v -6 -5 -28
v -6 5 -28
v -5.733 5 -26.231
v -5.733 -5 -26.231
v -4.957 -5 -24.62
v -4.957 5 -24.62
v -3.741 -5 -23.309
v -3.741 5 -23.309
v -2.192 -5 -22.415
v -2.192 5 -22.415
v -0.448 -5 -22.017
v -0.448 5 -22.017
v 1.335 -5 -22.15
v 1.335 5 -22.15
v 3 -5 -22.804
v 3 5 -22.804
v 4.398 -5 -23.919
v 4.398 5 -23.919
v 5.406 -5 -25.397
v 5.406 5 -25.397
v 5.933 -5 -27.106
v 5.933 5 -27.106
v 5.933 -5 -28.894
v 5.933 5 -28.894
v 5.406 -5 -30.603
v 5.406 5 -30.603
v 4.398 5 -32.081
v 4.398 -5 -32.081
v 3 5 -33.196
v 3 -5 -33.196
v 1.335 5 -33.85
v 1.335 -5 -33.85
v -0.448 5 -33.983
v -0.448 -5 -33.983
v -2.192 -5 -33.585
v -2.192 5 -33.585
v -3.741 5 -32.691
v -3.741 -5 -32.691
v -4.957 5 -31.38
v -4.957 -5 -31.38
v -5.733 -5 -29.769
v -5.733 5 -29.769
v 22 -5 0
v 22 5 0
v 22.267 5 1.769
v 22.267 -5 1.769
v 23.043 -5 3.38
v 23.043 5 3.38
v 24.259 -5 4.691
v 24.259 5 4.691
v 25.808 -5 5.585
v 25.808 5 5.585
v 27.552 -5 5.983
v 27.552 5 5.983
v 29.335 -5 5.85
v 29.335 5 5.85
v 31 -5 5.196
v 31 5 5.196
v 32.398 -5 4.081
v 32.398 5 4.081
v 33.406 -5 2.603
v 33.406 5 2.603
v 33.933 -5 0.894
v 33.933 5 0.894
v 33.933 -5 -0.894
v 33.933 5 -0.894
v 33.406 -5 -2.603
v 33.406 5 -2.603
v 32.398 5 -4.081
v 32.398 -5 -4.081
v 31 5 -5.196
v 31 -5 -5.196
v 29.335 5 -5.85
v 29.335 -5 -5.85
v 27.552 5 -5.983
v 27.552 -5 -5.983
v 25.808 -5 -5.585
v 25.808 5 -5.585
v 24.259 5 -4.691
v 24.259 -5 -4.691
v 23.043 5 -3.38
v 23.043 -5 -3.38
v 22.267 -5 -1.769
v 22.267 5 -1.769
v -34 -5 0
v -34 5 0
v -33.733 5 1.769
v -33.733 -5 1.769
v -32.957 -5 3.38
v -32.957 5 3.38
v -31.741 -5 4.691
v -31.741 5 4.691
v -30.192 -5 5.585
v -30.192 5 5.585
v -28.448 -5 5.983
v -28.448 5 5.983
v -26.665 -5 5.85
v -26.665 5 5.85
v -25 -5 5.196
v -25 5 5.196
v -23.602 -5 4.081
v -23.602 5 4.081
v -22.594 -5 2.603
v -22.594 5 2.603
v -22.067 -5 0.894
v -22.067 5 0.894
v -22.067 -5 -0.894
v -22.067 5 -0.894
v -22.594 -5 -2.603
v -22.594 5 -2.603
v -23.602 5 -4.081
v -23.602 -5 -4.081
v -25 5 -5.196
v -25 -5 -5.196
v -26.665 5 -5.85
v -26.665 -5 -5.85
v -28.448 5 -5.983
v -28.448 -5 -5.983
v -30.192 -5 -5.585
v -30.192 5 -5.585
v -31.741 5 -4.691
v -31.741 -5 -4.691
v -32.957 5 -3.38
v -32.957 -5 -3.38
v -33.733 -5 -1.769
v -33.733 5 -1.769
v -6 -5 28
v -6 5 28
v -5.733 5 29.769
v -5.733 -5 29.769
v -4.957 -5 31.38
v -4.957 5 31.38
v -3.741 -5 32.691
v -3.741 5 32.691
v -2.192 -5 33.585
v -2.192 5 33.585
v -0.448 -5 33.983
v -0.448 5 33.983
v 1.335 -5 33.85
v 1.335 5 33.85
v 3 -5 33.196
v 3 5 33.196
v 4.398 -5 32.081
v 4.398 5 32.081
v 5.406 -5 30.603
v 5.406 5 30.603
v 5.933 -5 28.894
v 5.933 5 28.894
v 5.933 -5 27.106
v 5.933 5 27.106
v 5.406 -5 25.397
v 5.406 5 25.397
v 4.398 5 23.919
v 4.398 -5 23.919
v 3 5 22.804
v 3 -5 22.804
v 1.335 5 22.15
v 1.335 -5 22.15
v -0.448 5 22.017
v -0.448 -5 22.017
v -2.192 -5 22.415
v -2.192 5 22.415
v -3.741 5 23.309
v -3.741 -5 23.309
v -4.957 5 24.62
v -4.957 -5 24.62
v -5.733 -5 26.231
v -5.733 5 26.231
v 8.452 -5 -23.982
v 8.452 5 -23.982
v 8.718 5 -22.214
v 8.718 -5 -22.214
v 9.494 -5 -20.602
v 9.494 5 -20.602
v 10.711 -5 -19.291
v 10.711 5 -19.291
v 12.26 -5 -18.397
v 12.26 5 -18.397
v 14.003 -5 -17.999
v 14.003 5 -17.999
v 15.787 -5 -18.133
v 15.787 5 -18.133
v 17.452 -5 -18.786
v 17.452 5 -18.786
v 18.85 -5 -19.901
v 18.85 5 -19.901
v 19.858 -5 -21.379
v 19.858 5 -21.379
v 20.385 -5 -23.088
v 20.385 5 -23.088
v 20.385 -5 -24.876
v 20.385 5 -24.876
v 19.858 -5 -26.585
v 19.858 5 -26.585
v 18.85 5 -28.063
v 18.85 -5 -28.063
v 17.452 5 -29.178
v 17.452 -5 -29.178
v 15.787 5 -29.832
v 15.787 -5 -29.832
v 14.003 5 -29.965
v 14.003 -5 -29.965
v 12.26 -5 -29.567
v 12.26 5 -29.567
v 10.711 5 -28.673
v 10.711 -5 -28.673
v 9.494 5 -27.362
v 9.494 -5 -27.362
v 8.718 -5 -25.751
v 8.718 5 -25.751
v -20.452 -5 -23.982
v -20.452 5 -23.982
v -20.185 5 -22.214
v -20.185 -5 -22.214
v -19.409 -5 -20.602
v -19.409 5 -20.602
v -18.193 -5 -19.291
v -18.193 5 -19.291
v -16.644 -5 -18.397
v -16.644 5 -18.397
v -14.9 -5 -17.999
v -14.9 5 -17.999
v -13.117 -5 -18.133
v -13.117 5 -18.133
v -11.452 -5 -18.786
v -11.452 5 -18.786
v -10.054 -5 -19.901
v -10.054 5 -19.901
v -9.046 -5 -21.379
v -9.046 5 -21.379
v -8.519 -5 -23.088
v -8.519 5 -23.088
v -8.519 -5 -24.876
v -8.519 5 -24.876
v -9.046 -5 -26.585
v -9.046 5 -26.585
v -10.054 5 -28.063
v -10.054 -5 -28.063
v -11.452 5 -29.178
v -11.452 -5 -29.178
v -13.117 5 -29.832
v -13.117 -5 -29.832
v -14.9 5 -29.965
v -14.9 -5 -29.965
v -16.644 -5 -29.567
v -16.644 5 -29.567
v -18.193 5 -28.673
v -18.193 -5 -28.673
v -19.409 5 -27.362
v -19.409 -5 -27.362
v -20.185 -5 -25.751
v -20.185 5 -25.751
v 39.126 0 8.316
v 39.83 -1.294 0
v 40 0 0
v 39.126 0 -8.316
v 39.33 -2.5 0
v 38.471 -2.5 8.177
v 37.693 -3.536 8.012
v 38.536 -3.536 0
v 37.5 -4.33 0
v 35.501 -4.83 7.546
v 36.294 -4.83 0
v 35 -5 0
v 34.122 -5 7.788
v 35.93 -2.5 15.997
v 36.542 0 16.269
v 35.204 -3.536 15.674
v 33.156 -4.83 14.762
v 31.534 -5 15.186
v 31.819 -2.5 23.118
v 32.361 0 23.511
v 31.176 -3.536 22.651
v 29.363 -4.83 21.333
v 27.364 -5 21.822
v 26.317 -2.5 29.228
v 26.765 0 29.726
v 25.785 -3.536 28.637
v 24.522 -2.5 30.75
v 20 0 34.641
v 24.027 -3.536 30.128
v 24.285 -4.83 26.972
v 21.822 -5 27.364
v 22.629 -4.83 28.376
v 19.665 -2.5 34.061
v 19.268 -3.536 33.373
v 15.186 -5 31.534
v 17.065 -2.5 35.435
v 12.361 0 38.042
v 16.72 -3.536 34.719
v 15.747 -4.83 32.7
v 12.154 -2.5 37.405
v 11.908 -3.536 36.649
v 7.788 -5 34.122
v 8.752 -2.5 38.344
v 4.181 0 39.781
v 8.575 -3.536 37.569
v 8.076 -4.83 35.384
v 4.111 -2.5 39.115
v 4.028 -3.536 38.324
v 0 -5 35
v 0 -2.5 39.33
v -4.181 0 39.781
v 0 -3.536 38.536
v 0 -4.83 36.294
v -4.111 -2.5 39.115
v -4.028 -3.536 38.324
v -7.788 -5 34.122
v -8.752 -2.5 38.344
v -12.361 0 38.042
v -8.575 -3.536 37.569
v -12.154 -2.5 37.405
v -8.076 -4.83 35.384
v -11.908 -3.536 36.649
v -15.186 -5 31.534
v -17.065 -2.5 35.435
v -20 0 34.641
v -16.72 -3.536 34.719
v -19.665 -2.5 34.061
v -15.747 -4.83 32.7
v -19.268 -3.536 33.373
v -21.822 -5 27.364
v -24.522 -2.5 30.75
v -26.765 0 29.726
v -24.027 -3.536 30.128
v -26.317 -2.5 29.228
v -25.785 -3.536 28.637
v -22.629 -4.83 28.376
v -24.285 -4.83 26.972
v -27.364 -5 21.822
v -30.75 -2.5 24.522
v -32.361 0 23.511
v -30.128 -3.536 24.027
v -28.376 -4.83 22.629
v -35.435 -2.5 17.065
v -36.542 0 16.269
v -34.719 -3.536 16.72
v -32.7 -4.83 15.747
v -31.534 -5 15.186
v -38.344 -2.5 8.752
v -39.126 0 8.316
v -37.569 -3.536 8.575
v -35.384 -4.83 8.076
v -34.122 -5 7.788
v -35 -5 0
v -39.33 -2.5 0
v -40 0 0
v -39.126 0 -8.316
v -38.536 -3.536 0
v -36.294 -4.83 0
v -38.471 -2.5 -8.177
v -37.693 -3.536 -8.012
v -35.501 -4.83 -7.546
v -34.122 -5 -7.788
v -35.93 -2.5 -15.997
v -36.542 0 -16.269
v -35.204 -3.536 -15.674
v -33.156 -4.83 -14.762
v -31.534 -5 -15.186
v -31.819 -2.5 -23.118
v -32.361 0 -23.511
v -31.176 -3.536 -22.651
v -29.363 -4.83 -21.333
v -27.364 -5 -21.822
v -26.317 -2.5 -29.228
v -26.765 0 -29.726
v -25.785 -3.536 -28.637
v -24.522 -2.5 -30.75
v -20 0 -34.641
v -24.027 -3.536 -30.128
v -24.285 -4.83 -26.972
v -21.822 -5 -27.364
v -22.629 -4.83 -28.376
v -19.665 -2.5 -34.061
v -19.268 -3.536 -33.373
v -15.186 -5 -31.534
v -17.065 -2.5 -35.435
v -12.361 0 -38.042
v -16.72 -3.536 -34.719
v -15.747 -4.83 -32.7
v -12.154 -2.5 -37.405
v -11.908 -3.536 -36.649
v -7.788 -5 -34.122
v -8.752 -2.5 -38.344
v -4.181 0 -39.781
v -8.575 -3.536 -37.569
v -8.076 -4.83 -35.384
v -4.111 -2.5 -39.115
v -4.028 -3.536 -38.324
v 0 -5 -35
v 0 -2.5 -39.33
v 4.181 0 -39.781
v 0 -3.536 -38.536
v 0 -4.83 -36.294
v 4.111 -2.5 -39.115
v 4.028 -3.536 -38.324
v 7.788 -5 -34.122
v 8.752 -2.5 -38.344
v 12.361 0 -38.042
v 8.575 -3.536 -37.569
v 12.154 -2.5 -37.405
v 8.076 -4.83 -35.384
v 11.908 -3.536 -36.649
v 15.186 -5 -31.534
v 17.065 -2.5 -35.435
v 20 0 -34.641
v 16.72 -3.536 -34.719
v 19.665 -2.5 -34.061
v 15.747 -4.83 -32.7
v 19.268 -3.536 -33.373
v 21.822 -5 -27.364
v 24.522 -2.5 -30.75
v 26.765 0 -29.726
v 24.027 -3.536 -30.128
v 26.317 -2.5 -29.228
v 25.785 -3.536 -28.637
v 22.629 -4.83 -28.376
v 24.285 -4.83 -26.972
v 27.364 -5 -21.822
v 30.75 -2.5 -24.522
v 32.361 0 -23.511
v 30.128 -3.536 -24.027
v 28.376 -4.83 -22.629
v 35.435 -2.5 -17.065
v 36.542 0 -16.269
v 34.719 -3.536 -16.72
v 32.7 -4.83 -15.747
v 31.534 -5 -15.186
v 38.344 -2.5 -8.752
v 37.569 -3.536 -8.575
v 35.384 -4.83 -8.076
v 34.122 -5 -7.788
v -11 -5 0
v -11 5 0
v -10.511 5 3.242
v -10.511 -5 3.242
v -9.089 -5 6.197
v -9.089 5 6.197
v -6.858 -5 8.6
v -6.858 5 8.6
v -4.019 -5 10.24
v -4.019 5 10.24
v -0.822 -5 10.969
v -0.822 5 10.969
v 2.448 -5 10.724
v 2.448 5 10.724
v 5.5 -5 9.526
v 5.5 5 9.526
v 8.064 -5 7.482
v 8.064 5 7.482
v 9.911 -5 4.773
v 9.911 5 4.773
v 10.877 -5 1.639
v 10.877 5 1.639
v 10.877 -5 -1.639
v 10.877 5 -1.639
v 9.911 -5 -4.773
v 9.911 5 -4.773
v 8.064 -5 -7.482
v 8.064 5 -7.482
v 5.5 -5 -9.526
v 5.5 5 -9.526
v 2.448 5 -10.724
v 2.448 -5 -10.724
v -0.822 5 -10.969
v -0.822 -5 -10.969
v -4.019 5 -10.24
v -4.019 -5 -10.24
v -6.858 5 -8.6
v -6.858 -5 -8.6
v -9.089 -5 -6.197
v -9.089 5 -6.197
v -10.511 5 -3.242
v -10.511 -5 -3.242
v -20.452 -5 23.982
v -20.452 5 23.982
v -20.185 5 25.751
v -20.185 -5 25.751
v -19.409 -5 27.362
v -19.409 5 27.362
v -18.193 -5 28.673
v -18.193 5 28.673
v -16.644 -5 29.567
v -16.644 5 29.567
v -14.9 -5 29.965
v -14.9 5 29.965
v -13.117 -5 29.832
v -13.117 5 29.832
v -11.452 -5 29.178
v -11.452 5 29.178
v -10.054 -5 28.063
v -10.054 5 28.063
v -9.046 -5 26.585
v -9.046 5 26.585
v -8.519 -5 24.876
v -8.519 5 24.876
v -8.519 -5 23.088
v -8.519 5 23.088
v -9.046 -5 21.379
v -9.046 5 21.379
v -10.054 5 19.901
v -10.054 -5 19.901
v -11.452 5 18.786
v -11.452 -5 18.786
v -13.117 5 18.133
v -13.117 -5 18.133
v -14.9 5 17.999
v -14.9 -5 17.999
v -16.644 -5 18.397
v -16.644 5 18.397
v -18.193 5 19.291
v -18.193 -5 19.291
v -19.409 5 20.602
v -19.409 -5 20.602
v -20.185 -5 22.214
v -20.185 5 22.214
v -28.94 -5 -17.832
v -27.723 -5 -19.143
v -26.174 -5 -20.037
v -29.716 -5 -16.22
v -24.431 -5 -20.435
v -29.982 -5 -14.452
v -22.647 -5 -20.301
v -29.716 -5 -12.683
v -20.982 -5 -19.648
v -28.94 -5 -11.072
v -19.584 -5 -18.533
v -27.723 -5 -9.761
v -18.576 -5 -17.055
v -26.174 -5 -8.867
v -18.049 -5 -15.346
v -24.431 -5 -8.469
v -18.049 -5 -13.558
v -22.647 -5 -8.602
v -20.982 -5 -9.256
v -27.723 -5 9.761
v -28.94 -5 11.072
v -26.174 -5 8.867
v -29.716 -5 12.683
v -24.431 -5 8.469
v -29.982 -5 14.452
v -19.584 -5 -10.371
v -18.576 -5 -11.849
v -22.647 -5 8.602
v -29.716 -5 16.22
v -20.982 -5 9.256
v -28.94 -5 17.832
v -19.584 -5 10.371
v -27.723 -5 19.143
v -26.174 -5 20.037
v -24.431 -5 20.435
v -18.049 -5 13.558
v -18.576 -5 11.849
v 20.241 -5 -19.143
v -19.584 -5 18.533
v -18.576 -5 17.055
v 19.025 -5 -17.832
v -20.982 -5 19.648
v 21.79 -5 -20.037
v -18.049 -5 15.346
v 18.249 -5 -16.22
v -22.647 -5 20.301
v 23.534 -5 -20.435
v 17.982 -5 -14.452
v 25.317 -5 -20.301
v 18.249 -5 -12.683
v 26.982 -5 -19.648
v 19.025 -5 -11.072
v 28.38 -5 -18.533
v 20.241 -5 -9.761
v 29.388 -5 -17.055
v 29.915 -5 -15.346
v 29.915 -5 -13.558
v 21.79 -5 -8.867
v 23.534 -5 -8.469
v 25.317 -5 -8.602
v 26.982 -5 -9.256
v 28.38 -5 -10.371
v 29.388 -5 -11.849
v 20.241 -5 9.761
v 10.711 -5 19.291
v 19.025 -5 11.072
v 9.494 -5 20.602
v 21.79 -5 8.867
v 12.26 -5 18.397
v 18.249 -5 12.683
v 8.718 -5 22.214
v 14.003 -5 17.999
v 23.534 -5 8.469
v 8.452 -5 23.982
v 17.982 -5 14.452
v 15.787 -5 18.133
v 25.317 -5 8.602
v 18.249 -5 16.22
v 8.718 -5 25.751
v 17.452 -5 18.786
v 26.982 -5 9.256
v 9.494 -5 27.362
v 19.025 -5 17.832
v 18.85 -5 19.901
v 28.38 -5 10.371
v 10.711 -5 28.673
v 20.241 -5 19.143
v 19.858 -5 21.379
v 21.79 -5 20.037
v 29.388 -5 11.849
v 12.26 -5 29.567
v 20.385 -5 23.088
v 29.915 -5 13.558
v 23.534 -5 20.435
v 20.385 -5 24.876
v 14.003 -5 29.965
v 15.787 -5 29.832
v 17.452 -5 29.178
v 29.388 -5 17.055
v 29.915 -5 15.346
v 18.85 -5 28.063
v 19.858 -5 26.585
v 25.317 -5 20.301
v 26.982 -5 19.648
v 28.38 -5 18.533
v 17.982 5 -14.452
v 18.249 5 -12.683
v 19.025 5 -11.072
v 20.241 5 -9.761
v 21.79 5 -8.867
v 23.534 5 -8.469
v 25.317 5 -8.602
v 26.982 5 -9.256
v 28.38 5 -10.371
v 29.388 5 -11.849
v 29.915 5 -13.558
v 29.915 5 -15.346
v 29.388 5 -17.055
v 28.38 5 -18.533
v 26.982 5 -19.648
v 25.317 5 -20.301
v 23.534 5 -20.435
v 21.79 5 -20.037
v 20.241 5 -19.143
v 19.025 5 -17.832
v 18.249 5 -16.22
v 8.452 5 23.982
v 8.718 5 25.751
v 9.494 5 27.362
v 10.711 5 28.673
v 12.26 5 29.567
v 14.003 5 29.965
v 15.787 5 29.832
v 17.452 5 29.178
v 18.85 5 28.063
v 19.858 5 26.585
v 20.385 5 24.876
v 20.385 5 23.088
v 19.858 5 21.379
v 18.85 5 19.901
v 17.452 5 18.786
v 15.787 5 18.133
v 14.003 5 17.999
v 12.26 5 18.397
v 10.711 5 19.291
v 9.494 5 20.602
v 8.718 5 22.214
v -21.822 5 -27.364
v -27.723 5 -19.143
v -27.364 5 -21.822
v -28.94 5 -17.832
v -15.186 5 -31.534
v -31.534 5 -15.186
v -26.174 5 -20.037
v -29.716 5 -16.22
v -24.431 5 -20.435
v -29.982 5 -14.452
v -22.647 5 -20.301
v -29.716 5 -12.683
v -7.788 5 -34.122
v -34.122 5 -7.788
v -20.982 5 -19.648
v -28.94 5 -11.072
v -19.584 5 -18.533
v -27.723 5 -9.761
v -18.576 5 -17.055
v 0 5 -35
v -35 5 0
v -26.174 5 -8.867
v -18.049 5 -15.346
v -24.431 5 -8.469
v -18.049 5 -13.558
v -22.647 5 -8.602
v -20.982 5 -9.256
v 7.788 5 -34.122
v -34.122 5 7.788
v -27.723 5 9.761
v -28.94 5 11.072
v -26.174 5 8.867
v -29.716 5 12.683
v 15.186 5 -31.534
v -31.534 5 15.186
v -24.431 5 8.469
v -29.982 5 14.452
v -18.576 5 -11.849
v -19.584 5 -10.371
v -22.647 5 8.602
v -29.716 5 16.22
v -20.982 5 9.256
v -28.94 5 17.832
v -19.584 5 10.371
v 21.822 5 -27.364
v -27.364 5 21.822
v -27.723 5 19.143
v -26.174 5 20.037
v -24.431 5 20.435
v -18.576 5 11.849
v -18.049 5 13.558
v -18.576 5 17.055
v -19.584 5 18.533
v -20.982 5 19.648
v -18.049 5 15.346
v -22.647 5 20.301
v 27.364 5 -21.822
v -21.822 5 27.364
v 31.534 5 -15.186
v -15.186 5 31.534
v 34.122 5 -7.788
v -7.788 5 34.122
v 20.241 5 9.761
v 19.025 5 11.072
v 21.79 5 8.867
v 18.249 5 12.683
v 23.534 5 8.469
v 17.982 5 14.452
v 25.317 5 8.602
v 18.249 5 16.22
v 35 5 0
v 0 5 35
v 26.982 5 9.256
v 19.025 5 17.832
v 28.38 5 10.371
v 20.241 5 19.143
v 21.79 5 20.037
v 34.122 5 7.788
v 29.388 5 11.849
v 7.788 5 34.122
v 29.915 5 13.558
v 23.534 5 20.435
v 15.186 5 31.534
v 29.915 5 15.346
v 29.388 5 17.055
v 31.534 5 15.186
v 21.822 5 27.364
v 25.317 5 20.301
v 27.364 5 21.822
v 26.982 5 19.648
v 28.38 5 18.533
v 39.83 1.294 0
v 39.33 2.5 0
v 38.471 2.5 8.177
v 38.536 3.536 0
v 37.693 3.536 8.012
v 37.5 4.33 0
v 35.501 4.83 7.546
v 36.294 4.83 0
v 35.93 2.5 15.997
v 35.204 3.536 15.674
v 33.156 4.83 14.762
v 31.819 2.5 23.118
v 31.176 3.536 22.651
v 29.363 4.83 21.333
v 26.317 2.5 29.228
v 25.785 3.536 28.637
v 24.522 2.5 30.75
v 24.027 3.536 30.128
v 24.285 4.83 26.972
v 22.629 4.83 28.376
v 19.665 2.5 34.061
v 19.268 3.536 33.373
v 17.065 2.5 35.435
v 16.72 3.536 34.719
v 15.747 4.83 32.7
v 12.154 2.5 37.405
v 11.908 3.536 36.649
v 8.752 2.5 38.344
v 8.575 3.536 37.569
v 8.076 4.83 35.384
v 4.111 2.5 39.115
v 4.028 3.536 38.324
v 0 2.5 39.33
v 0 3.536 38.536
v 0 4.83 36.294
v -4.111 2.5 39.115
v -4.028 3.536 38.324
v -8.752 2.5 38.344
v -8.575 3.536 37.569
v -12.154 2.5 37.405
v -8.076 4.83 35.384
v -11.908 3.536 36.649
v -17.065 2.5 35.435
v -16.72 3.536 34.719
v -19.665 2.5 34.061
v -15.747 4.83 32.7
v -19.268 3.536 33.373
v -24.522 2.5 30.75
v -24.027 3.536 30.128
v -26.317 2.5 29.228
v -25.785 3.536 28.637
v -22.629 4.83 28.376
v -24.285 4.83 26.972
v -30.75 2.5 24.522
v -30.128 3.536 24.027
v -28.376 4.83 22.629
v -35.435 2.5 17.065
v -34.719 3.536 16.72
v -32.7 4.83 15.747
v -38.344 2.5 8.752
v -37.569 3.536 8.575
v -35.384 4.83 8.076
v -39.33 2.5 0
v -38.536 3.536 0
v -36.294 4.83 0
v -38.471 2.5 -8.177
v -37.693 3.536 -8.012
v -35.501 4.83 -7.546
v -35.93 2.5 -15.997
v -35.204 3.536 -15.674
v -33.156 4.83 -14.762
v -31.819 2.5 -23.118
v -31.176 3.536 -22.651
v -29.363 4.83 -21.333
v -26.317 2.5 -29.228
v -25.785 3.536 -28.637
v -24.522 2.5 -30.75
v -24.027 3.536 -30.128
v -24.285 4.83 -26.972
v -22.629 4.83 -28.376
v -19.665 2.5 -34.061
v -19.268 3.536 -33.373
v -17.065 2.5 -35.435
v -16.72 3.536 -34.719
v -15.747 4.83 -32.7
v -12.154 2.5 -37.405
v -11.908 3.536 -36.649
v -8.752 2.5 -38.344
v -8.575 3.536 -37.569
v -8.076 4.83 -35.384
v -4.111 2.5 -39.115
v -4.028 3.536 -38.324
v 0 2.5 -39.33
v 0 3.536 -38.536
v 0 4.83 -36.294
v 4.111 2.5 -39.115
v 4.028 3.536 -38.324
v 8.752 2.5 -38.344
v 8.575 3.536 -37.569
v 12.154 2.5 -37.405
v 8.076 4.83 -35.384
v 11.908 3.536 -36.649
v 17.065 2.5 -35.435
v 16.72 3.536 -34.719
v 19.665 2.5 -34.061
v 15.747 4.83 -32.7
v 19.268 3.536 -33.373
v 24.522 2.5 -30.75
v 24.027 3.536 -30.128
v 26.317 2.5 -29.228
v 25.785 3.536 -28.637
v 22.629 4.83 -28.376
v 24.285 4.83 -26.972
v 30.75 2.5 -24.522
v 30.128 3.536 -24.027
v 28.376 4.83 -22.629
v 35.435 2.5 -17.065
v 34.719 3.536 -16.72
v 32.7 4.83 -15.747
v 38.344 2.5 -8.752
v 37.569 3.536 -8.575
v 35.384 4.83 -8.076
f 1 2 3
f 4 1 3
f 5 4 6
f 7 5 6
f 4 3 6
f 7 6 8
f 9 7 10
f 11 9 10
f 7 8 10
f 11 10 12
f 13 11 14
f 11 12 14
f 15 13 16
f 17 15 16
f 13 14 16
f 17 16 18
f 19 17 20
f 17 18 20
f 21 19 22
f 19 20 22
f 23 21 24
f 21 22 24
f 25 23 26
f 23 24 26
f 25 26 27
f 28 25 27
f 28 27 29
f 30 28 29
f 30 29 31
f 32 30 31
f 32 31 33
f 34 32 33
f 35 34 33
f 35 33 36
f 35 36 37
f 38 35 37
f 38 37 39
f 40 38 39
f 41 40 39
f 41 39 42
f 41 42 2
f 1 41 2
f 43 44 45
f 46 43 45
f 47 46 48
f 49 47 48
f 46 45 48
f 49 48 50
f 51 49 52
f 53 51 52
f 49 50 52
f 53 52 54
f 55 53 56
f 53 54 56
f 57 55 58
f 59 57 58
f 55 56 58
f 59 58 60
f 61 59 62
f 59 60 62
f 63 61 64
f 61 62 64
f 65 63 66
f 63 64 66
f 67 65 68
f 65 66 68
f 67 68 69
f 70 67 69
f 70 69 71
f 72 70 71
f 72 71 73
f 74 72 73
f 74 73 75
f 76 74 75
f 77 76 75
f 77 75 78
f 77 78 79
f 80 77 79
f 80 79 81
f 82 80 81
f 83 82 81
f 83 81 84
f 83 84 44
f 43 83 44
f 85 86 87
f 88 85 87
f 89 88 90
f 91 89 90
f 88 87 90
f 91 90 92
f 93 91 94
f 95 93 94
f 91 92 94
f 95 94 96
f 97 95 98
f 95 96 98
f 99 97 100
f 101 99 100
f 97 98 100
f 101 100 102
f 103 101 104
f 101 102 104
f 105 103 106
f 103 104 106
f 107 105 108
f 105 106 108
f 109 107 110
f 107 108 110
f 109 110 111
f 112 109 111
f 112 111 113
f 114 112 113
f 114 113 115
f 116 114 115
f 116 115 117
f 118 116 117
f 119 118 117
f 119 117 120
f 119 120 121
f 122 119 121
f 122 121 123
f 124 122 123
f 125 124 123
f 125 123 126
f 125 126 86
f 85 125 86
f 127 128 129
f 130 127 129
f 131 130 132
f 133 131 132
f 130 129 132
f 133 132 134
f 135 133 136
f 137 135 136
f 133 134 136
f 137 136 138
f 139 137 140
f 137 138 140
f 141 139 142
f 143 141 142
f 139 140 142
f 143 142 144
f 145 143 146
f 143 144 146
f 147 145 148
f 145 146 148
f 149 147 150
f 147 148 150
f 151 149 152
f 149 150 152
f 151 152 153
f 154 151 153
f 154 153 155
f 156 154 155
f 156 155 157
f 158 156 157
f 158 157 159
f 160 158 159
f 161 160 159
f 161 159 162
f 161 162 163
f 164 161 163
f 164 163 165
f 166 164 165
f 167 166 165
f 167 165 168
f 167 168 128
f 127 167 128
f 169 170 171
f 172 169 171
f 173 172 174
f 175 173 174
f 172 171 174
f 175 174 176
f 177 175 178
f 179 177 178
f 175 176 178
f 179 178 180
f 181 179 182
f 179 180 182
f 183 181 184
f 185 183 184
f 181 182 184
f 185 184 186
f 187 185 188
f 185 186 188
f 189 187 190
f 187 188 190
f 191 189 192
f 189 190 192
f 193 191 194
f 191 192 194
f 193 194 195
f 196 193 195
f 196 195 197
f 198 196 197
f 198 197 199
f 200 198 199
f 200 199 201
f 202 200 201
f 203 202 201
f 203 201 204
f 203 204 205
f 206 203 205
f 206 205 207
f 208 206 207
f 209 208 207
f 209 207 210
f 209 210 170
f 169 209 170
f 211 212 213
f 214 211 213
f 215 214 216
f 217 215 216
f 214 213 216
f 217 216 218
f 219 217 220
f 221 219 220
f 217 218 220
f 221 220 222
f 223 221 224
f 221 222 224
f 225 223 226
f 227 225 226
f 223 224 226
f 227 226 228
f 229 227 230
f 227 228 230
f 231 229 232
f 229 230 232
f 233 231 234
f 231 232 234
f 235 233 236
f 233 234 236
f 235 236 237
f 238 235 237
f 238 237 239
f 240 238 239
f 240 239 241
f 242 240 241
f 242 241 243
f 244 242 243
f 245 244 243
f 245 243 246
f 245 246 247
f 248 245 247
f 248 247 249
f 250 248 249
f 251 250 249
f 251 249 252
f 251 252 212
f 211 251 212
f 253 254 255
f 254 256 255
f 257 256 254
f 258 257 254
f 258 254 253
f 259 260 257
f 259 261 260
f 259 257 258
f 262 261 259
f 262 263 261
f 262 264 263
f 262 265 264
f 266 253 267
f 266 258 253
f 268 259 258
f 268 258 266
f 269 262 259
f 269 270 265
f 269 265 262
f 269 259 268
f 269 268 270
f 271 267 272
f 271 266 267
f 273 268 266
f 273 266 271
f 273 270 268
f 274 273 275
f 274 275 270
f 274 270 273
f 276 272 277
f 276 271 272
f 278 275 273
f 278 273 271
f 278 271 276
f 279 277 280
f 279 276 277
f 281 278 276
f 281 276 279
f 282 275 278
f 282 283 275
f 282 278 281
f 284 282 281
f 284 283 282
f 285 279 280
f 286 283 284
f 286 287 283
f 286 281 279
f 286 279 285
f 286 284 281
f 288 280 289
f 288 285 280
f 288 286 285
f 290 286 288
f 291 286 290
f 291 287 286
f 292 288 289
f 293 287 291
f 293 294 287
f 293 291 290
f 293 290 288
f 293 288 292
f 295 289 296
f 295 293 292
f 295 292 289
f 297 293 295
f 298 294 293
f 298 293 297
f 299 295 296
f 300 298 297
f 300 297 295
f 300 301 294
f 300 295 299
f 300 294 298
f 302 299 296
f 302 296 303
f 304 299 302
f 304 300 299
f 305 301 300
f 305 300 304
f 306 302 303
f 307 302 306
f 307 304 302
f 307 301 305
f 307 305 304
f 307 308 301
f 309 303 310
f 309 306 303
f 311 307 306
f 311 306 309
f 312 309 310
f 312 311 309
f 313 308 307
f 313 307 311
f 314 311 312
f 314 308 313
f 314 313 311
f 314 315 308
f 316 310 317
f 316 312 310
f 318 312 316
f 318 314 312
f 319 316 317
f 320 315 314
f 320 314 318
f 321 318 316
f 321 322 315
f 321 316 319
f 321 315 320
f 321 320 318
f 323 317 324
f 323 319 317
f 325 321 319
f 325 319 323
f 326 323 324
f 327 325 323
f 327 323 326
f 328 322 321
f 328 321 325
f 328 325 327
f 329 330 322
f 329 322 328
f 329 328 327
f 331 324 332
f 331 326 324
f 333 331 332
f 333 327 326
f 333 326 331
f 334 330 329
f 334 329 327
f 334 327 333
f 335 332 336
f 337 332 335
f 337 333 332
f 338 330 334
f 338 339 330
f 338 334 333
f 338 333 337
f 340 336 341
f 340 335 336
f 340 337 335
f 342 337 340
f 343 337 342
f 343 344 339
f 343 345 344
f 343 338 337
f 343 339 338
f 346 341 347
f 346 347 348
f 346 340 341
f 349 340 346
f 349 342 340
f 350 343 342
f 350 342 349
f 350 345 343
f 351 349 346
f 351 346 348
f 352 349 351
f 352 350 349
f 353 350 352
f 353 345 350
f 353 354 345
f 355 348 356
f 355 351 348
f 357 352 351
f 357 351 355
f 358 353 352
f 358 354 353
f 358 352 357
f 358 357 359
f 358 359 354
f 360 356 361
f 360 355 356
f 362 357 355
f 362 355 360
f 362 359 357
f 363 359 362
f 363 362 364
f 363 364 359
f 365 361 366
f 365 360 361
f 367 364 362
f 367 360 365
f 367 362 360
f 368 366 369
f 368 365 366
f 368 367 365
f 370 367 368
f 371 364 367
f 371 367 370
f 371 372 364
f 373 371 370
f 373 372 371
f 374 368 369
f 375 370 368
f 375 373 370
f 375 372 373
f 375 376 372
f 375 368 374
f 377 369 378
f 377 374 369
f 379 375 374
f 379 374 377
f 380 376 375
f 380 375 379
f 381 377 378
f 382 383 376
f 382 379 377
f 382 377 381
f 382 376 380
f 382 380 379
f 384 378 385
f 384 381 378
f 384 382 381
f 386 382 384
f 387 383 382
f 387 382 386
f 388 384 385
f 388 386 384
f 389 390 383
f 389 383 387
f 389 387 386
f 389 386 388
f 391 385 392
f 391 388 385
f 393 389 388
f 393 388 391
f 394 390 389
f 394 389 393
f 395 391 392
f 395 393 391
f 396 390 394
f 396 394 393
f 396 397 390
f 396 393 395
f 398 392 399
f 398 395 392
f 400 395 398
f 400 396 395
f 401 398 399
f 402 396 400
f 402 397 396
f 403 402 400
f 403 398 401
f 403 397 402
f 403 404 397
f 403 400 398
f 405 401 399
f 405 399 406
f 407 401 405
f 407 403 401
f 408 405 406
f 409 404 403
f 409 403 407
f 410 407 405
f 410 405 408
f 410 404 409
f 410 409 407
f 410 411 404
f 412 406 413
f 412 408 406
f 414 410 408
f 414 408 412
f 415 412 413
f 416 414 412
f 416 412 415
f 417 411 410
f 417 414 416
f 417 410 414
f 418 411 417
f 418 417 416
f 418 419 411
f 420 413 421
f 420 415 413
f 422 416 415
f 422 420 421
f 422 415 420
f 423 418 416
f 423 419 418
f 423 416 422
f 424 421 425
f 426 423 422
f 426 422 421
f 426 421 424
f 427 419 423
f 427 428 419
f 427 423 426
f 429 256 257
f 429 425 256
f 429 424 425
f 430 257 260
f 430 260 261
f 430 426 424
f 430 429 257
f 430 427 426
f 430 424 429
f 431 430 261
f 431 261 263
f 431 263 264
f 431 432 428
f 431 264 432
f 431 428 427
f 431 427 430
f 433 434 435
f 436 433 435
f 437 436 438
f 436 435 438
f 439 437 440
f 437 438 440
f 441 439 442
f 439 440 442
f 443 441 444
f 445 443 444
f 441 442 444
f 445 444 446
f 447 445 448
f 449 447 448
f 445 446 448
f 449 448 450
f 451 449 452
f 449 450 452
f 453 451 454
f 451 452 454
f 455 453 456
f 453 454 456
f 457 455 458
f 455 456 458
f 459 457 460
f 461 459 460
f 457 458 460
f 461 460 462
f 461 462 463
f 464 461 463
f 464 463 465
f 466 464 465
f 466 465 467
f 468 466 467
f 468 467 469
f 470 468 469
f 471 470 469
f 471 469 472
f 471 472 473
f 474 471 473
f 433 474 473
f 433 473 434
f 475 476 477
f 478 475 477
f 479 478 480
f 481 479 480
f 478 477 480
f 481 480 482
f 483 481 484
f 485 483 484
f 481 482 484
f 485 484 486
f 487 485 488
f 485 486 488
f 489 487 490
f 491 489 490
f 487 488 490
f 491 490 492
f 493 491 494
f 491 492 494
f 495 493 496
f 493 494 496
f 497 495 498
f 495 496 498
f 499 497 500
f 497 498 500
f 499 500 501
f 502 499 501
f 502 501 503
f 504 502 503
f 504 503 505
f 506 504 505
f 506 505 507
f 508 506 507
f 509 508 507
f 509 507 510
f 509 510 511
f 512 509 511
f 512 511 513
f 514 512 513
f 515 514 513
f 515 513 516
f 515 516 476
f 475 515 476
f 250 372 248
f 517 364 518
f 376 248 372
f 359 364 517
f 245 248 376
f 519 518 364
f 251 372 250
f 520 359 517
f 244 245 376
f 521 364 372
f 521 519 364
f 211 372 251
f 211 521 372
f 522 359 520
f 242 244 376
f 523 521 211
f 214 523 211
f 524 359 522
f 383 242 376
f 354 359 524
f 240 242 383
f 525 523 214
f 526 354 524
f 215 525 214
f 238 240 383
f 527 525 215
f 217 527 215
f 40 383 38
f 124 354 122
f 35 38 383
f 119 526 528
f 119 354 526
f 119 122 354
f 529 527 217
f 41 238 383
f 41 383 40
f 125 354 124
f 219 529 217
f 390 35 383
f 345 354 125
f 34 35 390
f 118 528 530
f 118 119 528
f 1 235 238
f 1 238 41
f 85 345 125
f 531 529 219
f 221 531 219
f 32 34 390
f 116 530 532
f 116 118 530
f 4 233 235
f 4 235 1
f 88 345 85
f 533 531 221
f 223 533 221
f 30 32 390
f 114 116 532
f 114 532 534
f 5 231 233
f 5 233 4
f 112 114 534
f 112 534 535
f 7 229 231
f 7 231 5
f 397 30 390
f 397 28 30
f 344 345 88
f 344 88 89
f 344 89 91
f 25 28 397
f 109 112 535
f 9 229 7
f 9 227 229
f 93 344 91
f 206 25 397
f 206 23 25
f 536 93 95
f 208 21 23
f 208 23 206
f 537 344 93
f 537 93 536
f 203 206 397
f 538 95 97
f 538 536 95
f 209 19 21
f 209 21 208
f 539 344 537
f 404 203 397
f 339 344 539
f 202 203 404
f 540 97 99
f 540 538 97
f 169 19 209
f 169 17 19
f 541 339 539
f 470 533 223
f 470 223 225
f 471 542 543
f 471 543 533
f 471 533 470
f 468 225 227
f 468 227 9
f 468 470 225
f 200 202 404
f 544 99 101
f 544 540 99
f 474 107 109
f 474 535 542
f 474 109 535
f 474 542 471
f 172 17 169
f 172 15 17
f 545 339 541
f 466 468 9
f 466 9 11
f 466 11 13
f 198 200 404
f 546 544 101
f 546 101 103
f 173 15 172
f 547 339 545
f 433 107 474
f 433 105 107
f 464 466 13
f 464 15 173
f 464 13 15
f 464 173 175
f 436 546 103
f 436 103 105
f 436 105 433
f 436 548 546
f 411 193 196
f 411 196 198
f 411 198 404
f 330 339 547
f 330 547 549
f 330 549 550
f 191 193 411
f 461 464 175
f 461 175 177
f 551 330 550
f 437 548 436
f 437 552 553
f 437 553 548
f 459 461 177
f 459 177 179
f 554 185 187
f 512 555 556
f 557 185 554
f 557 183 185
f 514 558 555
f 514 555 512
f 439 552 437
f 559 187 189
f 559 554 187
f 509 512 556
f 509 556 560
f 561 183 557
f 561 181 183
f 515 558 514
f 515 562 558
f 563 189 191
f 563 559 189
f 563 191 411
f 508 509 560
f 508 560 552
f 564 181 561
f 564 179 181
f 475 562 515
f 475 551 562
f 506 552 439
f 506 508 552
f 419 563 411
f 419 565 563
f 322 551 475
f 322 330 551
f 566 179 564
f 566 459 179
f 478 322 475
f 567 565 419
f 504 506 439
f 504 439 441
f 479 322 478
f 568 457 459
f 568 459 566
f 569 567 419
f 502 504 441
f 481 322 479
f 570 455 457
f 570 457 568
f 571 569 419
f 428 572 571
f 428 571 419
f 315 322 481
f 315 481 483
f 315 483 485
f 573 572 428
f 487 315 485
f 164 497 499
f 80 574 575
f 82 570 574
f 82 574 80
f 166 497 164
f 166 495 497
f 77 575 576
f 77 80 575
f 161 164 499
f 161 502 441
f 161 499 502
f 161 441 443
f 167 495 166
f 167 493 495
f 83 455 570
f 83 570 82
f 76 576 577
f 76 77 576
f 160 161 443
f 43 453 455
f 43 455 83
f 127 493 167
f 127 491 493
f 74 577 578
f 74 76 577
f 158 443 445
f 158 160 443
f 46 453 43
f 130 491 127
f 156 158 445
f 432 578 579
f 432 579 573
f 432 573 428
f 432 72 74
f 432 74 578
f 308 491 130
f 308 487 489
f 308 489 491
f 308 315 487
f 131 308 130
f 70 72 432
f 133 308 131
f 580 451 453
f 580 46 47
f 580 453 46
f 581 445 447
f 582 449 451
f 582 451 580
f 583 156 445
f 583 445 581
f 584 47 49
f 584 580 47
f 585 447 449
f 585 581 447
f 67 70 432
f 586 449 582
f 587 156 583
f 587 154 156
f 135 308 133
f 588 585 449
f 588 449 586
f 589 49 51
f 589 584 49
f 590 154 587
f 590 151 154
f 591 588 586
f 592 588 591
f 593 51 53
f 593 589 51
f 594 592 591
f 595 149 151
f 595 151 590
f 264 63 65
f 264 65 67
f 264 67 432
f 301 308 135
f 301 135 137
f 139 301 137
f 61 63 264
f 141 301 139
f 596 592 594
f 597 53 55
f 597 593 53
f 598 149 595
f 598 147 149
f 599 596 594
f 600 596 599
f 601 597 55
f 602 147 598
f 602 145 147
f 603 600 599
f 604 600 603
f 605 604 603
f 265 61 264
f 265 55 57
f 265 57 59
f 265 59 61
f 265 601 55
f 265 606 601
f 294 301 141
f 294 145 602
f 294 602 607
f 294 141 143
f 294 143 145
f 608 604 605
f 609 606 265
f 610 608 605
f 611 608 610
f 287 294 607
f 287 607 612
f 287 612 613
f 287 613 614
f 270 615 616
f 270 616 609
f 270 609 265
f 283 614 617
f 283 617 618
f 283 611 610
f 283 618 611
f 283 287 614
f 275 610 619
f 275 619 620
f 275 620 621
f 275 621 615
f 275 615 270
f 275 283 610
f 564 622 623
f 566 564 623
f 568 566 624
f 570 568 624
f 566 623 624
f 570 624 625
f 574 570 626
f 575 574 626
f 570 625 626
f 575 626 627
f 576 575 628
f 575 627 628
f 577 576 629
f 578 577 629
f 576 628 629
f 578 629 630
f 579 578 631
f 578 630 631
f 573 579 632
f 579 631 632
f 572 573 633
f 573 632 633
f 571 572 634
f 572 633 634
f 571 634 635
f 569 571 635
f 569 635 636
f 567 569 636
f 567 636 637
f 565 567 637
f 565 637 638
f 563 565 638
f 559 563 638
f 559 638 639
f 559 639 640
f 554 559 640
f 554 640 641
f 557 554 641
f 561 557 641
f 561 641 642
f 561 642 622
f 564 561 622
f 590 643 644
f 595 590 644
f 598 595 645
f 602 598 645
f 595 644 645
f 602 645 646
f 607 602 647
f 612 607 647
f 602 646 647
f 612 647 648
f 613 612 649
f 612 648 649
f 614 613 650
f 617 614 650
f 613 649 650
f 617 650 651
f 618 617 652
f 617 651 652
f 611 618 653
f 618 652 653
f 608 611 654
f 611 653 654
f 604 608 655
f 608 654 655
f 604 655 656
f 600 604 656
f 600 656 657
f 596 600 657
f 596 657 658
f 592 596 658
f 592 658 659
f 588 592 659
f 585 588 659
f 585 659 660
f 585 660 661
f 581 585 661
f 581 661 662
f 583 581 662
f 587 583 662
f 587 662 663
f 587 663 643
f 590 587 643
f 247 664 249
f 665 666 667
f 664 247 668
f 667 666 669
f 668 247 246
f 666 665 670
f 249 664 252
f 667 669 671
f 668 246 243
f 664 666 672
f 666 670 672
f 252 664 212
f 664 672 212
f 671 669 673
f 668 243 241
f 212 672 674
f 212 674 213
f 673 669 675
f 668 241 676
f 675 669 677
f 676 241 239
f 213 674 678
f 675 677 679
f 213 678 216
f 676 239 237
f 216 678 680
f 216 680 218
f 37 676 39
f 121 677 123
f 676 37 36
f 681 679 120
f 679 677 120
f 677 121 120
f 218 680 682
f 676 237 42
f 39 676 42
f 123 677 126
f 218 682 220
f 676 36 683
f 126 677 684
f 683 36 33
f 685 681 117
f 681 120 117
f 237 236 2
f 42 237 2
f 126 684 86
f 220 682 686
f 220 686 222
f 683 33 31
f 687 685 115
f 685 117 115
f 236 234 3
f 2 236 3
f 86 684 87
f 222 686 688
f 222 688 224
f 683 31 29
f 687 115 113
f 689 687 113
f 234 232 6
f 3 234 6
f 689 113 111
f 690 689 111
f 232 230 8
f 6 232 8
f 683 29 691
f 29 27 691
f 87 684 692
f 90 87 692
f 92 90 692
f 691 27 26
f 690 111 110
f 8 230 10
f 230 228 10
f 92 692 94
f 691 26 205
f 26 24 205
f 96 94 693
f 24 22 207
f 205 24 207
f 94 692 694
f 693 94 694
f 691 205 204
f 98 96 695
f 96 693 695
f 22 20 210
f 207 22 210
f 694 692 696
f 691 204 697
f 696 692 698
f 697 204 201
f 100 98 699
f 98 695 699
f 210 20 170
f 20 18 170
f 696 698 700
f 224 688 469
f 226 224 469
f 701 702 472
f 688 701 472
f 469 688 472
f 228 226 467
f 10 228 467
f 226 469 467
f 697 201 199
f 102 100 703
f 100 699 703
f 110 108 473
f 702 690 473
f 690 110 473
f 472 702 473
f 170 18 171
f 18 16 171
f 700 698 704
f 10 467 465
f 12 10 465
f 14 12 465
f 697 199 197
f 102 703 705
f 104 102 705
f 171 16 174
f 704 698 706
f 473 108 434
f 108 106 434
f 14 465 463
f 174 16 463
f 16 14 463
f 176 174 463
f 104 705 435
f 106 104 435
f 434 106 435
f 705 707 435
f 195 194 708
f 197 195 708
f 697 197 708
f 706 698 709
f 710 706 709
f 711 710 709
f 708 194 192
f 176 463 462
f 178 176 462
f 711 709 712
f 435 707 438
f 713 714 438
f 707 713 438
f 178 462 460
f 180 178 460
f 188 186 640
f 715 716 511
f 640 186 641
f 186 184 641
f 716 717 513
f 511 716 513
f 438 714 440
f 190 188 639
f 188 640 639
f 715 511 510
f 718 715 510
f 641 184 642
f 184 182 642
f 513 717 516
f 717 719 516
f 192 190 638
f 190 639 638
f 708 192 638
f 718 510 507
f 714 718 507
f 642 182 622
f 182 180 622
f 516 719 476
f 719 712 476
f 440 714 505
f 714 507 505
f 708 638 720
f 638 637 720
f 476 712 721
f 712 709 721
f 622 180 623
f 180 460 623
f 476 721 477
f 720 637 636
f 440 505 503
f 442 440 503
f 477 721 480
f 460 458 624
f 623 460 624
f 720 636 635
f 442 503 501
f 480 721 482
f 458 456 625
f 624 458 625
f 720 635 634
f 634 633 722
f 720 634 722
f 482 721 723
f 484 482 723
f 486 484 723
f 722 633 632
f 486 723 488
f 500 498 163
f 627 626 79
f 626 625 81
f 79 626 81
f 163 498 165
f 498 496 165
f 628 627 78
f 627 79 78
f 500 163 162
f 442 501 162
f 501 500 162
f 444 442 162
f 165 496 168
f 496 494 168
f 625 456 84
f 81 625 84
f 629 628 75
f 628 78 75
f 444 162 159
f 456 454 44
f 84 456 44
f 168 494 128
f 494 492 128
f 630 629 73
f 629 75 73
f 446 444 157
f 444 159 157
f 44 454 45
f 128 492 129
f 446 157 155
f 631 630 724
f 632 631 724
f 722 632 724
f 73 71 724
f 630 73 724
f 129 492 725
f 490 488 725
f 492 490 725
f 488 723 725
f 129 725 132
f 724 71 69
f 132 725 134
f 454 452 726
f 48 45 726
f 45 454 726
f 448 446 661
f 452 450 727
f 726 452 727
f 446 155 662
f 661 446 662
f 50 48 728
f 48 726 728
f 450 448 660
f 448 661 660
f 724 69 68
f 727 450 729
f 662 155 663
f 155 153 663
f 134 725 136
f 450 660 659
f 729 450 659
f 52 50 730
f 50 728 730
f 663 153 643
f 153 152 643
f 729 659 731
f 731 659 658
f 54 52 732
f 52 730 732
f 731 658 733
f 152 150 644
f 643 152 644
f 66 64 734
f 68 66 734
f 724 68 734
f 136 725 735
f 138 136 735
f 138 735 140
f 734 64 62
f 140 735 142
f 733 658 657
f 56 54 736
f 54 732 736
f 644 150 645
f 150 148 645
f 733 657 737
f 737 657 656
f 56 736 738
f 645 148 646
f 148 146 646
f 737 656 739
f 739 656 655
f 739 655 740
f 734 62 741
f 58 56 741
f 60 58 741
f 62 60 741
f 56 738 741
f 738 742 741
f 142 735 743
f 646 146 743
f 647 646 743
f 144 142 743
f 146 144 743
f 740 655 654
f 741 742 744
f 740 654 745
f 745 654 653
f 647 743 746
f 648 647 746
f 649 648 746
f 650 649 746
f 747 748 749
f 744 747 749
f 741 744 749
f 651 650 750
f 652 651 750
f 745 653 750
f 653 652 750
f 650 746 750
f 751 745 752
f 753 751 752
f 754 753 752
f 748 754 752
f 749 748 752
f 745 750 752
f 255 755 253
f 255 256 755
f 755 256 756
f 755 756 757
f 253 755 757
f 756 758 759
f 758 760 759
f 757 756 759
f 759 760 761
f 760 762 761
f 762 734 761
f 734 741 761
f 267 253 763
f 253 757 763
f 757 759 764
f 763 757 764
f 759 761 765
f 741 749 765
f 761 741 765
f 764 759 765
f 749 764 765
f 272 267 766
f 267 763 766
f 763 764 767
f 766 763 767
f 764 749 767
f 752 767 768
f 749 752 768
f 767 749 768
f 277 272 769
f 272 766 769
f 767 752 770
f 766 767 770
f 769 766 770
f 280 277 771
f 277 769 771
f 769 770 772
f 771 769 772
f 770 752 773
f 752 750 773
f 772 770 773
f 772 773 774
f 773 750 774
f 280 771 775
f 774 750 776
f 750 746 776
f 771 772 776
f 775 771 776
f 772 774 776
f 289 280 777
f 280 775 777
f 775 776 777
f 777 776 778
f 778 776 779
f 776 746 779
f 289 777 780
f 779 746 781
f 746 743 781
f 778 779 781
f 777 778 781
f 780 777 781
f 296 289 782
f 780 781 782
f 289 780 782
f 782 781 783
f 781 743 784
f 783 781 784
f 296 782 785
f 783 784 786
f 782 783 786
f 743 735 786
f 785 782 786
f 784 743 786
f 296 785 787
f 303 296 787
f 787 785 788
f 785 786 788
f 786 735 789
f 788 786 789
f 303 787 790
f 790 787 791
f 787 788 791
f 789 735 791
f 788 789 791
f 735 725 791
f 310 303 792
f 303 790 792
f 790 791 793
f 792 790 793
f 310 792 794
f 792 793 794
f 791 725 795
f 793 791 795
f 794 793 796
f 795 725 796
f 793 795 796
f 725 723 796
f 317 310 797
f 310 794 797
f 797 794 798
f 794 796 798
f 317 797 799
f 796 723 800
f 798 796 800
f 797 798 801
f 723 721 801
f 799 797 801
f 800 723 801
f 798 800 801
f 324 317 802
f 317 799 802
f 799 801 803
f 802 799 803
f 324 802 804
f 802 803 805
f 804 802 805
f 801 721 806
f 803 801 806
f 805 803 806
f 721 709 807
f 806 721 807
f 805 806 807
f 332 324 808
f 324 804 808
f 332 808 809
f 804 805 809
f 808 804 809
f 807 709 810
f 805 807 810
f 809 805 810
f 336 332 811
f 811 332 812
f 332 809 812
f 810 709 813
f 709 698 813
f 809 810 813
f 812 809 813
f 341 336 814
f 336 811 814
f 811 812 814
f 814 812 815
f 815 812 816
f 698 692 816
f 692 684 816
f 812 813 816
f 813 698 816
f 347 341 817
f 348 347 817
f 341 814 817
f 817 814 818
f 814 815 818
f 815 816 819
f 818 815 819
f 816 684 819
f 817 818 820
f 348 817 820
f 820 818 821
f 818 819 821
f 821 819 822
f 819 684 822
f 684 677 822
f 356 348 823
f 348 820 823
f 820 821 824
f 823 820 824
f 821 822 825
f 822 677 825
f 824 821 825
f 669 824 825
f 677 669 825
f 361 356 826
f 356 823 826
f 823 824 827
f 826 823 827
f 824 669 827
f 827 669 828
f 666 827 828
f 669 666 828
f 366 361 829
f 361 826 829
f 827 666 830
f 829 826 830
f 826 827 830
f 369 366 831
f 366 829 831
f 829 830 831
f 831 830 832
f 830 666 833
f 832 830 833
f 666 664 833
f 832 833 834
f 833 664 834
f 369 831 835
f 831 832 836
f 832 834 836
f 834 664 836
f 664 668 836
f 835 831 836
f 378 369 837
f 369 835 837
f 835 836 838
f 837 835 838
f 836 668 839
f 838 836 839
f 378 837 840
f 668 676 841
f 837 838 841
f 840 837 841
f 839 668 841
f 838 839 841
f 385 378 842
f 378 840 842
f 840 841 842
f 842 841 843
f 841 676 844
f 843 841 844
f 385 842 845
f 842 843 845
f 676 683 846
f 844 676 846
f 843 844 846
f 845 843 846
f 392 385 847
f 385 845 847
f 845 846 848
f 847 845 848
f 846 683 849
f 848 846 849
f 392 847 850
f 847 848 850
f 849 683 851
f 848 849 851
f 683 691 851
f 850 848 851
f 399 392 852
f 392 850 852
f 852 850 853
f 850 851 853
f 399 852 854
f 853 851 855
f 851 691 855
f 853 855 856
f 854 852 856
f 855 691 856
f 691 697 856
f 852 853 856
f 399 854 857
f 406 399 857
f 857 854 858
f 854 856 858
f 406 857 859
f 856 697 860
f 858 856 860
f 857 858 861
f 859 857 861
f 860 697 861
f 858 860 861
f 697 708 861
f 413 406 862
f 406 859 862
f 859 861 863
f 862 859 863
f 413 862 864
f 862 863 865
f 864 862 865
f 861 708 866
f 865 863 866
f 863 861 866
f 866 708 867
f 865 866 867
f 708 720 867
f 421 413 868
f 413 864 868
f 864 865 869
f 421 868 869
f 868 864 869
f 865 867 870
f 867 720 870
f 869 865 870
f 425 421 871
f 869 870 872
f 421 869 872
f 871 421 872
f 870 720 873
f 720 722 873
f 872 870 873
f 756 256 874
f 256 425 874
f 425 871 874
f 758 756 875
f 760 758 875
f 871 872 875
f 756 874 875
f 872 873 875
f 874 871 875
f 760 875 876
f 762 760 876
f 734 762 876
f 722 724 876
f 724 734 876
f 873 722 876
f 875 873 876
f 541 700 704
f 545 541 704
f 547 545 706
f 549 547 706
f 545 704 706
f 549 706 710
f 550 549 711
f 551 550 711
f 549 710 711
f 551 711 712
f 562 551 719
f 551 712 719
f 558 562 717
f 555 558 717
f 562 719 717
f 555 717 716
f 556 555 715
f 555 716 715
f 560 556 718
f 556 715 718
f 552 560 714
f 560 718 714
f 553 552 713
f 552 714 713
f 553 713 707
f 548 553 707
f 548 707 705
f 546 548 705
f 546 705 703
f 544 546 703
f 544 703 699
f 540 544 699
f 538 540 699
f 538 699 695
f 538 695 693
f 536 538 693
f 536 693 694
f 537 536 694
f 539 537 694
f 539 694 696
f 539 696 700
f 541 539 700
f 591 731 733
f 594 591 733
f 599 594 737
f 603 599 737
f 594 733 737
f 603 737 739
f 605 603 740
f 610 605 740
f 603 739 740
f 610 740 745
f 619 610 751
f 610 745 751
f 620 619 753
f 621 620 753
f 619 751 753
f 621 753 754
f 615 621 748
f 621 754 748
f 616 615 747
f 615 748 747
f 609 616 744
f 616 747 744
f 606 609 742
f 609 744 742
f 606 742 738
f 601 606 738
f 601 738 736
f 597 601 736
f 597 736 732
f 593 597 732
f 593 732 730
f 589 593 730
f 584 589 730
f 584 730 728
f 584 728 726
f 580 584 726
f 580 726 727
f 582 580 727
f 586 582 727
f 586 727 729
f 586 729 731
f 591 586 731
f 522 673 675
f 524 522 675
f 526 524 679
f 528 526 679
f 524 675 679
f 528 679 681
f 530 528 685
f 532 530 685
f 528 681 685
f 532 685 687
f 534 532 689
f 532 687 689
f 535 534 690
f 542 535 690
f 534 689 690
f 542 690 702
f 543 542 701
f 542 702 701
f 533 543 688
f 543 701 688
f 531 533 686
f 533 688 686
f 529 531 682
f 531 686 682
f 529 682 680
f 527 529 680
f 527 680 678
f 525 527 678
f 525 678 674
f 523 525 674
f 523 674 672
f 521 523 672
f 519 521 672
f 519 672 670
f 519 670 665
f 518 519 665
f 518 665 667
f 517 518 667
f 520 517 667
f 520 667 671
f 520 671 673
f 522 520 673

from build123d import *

# Parameters (mm, degrees)
F0_R     = 40
F1_DEPTH = 5
F3_D     = 22
F4_D     = 12
F5_R     = 4.99999


# Not quite as in the source:
# - a fillet or chamfer is up to 0.001 mm smaller than in the source, because OpenCascade refuses the exact size
# - a feature names something its author has since deleted; it is built from what else it names


with BuildPart() as f1:
    # F0 (on Front) → F1 (new body, symmetric)
    with BuildSketch(Plane.XZ):
        Circle(F0_R)
    extrude(amount=F1_DEPTH, both=True)

    # F3 (through all)
    with Locations(Plane.XZ.offset(5)):
        with Locations((0, 0)):
            Hole(F3_D / 2)

    # F4 (through all)
    with Locations(Plane.XZ.offset(5)):
        with Locations((-28, 0), (0, 28), (28, 0), (0, -28), (-23.9821428571, 14.4518796002), (-14.4518796002, 23.9821428571), (14.4518796002, 23.9821428571), (23.9821428571, 14.4518796002), (23.9821428571, -14.4518796002), (-14.4518796002, -23.9821428571), (14.4518796002, -23.9821428571), (-23.9821428571, -14.4518796002)):
            Hole(F4_D / 2)

    # F5 (radius 5 in the source; OpenCascade refuses exactly that, so slightly less here)
    f5_edges = [f1.edges().sort_by_distance(p)[0] for p in [
        (-40, -5, 0),
        (-40, 5, 0),
        (40, 0, 0),
    ]]
    fillet(f5_edges, radius=F5_R)


solid = f1.part
